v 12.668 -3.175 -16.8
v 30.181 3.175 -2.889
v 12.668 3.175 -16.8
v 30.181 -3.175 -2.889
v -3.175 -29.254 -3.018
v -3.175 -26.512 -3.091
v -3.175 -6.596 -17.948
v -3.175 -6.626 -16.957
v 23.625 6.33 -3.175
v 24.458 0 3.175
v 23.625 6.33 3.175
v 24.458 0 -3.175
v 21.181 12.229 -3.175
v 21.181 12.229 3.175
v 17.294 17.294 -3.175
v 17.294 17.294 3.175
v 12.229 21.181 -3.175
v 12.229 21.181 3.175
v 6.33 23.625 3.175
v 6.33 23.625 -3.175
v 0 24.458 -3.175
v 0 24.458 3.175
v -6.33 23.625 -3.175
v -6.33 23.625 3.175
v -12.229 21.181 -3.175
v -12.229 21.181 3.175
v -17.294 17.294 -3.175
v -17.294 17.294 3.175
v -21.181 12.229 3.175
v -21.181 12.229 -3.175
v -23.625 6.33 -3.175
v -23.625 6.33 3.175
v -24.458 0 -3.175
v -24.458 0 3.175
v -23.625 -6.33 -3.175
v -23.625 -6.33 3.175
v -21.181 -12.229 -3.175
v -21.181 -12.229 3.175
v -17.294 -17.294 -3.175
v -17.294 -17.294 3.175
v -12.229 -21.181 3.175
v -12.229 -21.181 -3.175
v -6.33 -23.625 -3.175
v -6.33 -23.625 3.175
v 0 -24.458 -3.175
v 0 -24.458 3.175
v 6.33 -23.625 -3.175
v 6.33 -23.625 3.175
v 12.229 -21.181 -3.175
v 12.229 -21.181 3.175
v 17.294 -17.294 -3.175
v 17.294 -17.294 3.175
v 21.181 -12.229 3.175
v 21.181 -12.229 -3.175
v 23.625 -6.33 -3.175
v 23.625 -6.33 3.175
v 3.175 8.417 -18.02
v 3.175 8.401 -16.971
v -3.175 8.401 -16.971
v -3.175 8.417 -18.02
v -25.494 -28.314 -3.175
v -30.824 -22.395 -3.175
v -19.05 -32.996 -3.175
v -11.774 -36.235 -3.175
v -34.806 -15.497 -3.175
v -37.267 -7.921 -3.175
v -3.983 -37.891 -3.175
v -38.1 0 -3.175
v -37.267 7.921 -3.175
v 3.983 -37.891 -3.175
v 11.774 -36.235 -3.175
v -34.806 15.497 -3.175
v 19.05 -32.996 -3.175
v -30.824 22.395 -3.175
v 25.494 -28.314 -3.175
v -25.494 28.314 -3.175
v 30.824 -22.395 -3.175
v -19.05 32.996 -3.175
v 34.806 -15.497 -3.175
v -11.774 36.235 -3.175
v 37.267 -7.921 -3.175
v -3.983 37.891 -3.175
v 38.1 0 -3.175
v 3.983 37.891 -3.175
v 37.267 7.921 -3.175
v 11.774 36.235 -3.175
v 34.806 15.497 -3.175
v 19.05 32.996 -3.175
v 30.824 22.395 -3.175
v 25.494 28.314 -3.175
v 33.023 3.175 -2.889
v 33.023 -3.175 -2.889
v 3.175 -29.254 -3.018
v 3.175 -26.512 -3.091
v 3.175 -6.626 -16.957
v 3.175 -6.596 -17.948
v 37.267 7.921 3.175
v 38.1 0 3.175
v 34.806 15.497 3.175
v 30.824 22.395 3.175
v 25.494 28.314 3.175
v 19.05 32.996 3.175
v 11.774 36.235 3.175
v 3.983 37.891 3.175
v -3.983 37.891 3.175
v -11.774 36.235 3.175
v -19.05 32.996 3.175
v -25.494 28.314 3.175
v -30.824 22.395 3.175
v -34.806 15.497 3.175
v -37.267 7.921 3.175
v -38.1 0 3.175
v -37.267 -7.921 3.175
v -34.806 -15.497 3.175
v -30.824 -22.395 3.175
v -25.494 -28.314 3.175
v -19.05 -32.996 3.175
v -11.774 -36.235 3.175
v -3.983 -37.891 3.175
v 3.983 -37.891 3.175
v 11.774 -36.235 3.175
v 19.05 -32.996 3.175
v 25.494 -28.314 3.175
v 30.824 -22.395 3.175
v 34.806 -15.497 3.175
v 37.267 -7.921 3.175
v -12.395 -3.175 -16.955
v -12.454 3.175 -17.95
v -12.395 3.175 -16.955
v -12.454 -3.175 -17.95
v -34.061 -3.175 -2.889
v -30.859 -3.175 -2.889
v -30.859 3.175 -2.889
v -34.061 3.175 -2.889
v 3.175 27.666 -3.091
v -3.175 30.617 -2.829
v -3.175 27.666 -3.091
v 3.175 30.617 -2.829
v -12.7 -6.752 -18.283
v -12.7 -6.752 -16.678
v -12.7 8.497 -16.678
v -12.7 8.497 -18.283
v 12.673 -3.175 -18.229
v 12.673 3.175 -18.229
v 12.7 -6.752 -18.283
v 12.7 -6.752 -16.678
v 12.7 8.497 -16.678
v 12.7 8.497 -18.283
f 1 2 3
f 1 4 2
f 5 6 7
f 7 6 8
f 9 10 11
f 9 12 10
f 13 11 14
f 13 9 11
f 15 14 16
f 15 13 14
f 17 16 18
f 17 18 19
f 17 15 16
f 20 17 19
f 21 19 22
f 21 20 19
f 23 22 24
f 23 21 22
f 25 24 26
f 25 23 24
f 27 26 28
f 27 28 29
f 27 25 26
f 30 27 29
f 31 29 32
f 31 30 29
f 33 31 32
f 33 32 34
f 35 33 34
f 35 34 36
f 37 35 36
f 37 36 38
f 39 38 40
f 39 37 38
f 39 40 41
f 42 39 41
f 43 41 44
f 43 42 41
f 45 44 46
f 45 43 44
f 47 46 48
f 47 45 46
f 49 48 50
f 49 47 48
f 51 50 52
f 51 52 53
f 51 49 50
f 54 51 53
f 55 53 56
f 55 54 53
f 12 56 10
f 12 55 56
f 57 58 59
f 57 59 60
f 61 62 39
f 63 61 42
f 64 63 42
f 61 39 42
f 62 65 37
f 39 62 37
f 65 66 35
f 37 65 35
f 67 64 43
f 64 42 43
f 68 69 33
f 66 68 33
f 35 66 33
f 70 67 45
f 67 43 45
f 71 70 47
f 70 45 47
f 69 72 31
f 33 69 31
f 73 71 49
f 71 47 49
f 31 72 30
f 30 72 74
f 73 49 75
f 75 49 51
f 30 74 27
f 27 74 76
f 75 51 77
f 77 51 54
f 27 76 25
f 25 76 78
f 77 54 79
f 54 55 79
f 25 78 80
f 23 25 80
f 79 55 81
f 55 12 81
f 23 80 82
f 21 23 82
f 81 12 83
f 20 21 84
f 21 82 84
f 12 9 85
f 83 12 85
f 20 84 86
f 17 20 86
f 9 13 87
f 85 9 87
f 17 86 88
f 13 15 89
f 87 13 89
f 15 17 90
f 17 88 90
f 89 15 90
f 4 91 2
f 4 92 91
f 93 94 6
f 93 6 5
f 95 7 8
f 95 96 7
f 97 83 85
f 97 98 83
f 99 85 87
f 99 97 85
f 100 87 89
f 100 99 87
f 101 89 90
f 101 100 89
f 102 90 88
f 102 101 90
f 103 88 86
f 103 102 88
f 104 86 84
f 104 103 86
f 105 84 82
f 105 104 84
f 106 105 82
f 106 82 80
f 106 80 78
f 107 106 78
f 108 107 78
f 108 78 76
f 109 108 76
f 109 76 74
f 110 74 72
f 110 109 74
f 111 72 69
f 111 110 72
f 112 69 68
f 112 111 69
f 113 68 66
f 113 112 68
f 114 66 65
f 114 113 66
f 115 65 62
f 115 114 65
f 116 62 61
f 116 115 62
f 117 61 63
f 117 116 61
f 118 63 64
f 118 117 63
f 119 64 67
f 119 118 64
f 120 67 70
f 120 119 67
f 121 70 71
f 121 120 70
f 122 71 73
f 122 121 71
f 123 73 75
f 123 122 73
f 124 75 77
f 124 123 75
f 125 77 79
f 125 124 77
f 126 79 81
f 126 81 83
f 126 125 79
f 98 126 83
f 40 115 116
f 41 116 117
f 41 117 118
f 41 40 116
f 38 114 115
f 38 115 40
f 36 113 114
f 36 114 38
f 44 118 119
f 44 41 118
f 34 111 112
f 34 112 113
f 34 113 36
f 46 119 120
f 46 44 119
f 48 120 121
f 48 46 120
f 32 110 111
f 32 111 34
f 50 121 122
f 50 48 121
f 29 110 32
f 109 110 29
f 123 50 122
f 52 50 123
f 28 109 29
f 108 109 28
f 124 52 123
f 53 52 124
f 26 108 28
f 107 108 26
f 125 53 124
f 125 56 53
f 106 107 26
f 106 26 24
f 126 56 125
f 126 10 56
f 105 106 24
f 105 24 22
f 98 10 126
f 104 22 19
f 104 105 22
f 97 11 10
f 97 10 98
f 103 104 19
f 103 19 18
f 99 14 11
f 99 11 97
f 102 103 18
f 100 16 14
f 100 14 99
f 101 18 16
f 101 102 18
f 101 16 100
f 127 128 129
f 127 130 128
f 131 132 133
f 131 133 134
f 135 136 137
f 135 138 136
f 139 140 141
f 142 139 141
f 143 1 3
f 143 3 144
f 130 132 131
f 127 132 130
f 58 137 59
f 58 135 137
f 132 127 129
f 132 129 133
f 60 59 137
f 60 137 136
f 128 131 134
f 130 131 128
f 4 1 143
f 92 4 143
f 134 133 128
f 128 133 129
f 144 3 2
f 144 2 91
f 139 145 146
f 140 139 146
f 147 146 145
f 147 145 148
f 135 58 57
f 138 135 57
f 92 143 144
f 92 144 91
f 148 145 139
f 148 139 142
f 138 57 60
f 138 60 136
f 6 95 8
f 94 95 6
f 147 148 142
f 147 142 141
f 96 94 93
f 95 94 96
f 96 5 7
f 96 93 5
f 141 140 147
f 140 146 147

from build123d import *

# Parameters (mm, degrees)
F0_R      = 38.1
F0_R_2    = 24.458109
F1_DEPTH  = 3.175
F2_W      = 15.248981
F2_H      = 1.605155
F3_DEPTH  = 12.7
F6_DEPTH  = 3.175
F8_DEPTH  = 3.175
F9_DEPTH  = 3.175
F10_DEPTH = 3.175


with BuildPart() as f1:
    # F0 (on Top) → F1 (new body, symmetric)
    with BuildSketch(Plane.XY):
        Circle(F0_R)
        Circle(F0_R_2, mode=Mode.SUBTRACT)
    extrude(amount=F1_DEPTH, both=True)


with BuildPart() as f3:
    # F2 (on Right) → F3 (new body, symmetric)
    with BuildSketch(Plane.YZ):
        with Locations((0.872386, -17.480517)):
            Rectangle(F2_W, F2_H)
    extrude(amount=F3_DEPTH, both=True)


with BuildPart() as f6:
    # F5 (on Front) → F6 (new body, symmetric)
    with BuildSketch(Plane.XZ):
        Polygon((-12.45362, -17.95028), (-12.394847, -16.955135), (-30.858776, -2.888602), (-34.061063, -2.888602), align=None)
    extrude(amount=F6_DEPTH, both=True)


with BuildPart() as f8:
    # F7 (on Front) → F8 (new body, symmetric)
    with BuildSketch(Plane.XZ):
        Polygon((30.180834, -2.889303), (12.668087, -16.80029), (12.672707, -18.229164), (33.022512, -2.889303), align=None)
    extrude(amount=F8_DEPTH, both=True)


with BuildPart() as f9:
    # F4 (on Right) → F9 (new body, symmetric)
    with BuildSketch(Plane.YZ):
        Polygon((-6.596426, -17.948236), (-6.626349, -16.956734), (-26.51205, -3.091325), (-29.254386, -3.018449), align=None)
    extrude(amount=F9_DEPTH, both=True)


with BuildPart() as f10:
    # F4 (on Right) → F10 (new body, symmetric)
    with BuildSketch(Plane.YZ):
        Polygon((27.666226, -3.091325), (8.401115, -16.971443), (8.416793, -18.020378), (30.616566, -2.829434), align=None)
    extrude(amount=F10_DEPTH, both=True)


solid = Compound([f1.part, f3.part, f6.part, f8.part, f9.part, f10.part])
